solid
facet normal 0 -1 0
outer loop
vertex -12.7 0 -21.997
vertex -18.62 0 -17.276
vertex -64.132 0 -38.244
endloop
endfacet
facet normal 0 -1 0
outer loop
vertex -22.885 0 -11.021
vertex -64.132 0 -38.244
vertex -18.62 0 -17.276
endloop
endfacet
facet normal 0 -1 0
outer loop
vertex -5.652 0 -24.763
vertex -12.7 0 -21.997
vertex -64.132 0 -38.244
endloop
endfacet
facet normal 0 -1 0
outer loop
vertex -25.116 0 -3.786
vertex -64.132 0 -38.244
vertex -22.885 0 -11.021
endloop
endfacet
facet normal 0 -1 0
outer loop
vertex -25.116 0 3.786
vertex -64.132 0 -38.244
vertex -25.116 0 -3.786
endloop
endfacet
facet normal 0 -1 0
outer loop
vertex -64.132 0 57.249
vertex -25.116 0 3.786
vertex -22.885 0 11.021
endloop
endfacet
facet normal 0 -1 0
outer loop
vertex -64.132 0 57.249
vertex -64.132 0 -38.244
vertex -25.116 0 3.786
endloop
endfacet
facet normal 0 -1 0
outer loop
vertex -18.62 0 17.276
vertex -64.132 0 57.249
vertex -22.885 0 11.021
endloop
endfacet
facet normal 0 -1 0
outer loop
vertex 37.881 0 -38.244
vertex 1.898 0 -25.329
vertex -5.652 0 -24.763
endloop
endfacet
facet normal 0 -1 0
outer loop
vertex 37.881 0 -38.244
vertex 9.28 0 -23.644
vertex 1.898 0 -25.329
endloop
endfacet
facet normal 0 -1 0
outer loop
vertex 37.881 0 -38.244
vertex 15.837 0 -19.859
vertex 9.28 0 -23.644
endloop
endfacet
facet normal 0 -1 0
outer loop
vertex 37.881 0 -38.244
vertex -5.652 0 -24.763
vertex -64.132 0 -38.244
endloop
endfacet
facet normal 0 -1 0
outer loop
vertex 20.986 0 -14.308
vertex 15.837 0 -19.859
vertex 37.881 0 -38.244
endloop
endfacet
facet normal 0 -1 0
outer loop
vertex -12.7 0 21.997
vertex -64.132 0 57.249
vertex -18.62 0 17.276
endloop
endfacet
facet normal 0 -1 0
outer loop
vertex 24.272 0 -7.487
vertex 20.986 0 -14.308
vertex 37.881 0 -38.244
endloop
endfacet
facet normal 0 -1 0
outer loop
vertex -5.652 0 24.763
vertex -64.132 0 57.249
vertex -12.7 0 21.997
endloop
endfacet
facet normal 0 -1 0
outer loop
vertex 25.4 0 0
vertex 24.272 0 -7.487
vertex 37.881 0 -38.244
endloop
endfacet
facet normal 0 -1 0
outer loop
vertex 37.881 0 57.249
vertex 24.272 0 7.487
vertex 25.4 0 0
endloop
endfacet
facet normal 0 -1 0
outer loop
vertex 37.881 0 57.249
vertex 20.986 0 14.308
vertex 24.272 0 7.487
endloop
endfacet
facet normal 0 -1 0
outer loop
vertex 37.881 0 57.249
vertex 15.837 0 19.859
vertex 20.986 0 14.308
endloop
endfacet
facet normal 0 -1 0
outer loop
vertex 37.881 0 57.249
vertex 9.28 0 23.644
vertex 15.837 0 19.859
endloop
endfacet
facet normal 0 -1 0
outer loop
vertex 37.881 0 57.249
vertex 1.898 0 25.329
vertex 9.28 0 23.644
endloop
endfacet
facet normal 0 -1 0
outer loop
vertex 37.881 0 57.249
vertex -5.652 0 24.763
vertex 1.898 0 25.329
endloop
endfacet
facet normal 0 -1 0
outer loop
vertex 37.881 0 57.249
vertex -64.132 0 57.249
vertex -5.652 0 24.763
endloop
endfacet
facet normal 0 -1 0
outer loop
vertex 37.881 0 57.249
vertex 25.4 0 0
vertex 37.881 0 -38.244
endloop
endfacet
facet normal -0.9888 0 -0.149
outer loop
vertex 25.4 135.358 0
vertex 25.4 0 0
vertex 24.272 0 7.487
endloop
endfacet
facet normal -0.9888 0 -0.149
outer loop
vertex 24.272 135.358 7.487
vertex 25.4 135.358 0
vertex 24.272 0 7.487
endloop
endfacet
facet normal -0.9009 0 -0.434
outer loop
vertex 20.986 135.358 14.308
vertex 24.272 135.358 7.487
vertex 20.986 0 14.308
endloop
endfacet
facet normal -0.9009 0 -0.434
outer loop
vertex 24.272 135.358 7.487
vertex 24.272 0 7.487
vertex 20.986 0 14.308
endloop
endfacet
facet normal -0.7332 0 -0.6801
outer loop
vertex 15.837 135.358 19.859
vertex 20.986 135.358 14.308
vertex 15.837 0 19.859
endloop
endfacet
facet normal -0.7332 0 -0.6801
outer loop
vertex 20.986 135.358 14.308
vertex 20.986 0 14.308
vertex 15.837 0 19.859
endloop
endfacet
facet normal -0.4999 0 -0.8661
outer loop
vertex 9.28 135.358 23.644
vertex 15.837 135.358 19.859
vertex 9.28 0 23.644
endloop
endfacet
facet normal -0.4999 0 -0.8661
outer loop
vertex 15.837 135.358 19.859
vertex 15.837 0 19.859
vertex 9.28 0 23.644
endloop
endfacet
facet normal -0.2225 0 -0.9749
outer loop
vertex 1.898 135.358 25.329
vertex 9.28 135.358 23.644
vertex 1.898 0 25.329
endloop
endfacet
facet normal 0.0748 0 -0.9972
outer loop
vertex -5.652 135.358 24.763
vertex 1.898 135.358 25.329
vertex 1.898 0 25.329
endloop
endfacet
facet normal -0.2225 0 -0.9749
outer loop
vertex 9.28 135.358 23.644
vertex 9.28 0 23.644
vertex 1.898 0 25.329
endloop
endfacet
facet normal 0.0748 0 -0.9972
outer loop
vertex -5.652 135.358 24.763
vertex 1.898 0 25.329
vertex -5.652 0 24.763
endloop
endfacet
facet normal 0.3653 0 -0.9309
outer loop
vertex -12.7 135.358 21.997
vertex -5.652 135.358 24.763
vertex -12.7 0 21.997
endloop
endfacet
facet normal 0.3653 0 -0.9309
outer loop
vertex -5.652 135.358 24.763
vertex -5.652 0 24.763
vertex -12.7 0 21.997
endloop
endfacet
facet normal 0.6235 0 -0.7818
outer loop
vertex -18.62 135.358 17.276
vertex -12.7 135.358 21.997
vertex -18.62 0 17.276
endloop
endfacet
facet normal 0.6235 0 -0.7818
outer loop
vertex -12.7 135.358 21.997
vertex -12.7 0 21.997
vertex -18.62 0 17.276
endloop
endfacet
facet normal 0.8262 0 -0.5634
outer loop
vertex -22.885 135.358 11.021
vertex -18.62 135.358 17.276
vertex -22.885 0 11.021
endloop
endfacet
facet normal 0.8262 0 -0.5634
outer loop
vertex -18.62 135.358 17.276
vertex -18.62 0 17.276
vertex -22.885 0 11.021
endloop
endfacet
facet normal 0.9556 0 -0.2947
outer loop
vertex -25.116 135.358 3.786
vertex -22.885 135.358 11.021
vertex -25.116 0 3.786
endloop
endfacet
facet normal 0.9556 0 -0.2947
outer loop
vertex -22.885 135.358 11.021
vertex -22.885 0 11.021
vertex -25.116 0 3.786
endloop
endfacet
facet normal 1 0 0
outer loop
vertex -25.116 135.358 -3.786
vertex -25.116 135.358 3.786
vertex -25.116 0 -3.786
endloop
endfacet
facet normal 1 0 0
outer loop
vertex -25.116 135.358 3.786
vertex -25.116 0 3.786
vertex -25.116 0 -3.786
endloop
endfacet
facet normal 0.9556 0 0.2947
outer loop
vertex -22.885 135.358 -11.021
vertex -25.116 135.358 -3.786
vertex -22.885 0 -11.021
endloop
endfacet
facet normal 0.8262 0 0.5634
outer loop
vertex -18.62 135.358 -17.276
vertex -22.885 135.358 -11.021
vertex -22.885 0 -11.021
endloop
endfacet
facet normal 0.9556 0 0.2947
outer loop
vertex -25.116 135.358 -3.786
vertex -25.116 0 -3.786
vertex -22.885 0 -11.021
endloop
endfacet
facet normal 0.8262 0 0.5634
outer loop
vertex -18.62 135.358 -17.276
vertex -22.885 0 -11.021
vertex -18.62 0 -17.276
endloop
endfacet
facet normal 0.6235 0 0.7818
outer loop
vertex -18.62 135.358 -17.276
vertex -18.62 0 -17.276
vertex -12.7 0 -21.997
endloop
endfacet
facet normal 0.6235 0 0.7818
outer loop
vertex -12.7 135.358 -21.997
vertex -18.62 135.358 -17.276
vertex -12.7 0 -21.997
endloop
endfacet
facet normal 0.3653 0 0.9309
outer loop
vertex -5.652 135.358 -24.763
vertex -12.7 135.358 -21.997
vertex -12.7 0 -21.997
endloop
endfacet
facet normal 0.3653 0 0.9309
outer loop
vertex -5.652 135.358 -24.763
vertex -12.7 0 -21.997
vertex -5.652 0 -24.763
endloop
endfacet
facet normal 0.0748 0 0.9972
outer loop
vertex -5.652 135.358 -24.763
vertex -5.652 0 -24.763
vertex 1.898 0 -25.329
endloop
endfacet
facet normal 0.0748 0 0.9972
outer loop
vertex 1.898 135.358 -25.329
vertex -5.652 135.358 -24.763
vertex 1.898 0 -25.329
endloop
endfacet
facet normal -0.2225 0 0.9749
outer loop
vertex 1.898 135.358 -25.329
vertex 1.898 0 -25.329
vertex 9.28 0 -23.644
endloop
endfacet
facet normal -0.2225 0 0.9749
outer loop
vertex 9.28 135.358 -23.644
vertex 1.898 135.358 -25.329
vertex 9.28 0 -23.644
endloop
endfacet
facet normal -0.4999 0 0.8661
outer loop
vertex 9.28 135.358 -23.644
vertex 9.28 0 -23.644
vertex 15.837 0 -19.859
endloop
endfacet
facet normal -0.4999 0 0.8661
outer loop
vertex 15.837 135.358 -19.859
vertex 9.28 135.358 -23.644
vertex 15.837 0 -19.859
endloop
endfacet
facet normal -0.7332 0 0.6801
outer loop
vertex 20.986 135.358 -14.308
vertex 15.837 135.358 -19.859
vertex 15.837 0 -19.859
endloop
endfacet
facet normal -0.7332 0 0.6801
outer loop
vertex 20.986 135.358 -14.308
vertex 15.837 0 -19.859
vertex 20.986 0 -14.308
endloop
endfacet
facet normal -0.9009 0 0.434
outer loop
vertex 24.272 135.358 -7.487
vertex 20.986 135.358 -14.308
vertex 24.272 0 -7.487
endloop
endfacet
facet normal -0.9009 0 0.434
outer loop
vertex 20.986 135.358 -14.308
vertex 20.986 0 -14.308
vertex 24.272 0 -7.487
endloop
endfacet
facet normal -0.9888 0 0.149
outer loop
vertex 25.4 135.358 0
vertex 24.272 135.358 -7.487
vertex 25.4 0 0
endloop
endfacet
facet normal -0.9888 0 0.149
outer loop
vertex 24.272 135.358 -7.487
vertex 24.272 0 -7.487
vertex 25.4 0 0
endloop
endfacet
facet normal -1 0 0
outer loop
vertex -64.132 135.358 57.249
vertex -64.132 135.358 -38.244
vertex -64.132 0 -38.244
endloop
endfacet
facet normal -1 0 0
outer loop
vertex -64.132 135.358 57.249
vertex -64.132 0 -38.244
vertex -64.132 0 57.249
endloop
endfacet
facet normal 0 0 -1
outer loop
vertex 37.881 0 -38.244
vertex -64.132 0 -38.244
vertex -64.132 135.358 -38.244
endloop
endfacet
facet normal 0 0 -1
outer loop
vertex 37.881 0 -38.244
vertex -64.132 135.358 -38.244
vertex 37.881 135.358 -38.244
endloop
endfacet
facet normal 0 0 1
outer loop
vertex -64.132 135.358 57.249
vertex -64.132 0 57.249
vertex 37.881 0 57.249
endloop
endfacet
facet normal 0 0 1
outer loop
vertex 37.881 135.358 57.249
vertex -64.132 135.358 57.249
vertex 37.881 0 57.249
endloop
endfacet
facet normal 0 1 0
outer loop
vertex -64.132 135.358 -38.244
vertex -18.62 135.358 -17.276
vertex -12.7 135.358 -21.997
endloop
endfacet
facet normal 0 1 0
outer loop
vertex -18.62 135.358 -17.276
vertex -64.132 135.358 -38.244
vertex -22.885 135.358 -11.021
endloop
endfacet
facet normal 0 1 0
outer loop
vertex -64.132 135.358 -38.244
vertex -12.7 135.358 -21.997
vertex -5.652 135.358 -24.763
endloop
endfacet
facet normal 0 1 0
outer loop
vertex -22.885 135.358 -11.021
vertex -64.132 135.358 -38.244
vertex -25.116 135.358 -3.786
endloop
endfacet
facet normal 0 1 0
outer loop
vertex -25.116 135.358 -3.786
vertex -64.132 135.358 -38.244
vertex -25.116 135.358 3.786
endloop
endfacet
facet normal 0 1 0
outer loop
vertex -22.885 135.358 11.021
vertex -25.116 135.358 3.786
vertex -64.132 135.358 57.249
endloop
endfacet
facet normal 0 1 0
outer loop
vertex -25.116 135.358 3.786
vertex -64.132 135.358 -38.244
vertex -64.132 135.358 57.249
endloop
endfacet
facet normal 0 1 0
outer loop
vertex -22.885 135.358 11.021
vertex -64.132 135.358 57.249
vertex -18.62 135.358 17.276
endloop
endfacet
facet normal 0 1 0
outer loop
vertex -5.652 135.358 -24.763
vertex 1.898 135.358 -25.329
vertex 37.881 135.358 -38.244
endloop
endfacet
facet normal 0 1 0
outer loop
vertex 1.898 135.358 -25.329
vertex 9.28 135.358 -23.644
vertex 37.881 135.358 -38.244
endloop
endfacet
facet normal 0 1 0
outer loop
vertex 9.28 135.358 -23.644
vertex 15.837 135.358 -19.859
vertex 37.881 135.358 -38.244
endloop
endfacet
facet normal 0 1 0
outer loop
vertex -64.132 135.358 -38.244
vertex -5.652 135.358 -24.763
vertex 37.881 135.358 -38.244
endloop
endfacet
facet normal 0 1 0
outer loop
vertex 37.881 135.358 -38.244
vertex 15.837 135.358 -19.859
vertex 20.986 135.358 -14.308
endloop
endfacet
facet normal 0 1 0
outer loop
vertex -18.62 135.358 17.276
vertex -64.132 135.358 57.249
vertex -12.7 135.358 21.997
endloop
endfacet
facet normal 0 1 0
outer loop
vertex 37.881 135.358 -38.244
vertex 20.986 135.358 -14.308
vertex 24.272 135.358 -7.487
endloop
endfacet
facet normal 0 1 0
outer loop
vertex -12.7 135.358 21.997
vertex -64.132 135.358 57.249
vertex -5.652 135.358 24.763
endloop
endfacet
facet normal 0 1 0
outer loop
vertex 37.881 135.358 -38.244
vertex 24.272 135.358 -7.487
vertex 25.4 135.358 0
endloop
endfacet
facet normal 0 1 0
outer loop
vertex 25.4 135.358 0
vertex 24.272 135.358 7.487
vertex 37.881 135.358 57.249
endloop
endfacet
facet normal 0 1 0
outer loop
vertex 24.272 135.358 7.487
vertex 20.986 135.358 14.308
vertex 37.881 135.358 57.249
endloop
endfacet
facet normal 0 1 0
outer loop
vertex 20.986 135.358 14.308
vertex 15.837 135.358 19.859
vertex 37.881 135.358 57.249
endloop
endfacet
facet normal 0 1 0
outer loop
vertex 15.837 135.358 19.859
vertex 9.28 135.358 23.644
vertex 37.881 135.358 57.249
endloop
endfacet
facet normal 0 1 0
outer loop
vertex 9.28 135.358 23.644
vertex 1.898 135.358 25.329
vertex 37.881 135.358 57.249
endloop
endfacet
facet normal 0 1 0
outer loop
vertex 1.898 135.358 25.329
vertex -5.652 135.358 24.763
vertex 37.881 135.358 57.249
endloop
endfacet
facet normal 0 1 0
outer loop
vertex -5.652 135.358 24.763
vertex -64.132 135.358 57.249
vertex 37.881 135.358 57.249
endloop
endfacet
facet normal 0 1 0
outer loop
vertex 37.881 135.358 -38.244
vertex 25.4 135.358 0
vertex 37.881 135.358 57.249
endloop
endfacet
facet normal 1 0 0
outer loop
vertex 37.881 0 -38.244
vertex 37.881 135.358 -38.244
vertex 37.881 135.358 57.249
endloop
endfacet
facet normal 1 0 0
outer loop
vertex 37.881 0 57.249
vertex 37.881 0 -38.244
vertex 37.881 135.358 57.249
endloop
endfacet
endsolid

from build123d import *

# Parameters (mm, degrees)
F0_W     = 102.013146
F0_H     = 95.492559
F0_R     = 25.4
F1_DEPTH = 135.357978


with BuildPart() as f1:
    # F0 (on Front) → F1 (new body)
    with BuildSketch(Plane.XZ):
        with Locations((-13.125478, 9.50263)):
            Rectangle(F0_W, F0_H)
        Circle(F0_R, mode=Mode.SUBTRACT)
    extrude(amount=-F1_DEPTH)


solid = f1.part
